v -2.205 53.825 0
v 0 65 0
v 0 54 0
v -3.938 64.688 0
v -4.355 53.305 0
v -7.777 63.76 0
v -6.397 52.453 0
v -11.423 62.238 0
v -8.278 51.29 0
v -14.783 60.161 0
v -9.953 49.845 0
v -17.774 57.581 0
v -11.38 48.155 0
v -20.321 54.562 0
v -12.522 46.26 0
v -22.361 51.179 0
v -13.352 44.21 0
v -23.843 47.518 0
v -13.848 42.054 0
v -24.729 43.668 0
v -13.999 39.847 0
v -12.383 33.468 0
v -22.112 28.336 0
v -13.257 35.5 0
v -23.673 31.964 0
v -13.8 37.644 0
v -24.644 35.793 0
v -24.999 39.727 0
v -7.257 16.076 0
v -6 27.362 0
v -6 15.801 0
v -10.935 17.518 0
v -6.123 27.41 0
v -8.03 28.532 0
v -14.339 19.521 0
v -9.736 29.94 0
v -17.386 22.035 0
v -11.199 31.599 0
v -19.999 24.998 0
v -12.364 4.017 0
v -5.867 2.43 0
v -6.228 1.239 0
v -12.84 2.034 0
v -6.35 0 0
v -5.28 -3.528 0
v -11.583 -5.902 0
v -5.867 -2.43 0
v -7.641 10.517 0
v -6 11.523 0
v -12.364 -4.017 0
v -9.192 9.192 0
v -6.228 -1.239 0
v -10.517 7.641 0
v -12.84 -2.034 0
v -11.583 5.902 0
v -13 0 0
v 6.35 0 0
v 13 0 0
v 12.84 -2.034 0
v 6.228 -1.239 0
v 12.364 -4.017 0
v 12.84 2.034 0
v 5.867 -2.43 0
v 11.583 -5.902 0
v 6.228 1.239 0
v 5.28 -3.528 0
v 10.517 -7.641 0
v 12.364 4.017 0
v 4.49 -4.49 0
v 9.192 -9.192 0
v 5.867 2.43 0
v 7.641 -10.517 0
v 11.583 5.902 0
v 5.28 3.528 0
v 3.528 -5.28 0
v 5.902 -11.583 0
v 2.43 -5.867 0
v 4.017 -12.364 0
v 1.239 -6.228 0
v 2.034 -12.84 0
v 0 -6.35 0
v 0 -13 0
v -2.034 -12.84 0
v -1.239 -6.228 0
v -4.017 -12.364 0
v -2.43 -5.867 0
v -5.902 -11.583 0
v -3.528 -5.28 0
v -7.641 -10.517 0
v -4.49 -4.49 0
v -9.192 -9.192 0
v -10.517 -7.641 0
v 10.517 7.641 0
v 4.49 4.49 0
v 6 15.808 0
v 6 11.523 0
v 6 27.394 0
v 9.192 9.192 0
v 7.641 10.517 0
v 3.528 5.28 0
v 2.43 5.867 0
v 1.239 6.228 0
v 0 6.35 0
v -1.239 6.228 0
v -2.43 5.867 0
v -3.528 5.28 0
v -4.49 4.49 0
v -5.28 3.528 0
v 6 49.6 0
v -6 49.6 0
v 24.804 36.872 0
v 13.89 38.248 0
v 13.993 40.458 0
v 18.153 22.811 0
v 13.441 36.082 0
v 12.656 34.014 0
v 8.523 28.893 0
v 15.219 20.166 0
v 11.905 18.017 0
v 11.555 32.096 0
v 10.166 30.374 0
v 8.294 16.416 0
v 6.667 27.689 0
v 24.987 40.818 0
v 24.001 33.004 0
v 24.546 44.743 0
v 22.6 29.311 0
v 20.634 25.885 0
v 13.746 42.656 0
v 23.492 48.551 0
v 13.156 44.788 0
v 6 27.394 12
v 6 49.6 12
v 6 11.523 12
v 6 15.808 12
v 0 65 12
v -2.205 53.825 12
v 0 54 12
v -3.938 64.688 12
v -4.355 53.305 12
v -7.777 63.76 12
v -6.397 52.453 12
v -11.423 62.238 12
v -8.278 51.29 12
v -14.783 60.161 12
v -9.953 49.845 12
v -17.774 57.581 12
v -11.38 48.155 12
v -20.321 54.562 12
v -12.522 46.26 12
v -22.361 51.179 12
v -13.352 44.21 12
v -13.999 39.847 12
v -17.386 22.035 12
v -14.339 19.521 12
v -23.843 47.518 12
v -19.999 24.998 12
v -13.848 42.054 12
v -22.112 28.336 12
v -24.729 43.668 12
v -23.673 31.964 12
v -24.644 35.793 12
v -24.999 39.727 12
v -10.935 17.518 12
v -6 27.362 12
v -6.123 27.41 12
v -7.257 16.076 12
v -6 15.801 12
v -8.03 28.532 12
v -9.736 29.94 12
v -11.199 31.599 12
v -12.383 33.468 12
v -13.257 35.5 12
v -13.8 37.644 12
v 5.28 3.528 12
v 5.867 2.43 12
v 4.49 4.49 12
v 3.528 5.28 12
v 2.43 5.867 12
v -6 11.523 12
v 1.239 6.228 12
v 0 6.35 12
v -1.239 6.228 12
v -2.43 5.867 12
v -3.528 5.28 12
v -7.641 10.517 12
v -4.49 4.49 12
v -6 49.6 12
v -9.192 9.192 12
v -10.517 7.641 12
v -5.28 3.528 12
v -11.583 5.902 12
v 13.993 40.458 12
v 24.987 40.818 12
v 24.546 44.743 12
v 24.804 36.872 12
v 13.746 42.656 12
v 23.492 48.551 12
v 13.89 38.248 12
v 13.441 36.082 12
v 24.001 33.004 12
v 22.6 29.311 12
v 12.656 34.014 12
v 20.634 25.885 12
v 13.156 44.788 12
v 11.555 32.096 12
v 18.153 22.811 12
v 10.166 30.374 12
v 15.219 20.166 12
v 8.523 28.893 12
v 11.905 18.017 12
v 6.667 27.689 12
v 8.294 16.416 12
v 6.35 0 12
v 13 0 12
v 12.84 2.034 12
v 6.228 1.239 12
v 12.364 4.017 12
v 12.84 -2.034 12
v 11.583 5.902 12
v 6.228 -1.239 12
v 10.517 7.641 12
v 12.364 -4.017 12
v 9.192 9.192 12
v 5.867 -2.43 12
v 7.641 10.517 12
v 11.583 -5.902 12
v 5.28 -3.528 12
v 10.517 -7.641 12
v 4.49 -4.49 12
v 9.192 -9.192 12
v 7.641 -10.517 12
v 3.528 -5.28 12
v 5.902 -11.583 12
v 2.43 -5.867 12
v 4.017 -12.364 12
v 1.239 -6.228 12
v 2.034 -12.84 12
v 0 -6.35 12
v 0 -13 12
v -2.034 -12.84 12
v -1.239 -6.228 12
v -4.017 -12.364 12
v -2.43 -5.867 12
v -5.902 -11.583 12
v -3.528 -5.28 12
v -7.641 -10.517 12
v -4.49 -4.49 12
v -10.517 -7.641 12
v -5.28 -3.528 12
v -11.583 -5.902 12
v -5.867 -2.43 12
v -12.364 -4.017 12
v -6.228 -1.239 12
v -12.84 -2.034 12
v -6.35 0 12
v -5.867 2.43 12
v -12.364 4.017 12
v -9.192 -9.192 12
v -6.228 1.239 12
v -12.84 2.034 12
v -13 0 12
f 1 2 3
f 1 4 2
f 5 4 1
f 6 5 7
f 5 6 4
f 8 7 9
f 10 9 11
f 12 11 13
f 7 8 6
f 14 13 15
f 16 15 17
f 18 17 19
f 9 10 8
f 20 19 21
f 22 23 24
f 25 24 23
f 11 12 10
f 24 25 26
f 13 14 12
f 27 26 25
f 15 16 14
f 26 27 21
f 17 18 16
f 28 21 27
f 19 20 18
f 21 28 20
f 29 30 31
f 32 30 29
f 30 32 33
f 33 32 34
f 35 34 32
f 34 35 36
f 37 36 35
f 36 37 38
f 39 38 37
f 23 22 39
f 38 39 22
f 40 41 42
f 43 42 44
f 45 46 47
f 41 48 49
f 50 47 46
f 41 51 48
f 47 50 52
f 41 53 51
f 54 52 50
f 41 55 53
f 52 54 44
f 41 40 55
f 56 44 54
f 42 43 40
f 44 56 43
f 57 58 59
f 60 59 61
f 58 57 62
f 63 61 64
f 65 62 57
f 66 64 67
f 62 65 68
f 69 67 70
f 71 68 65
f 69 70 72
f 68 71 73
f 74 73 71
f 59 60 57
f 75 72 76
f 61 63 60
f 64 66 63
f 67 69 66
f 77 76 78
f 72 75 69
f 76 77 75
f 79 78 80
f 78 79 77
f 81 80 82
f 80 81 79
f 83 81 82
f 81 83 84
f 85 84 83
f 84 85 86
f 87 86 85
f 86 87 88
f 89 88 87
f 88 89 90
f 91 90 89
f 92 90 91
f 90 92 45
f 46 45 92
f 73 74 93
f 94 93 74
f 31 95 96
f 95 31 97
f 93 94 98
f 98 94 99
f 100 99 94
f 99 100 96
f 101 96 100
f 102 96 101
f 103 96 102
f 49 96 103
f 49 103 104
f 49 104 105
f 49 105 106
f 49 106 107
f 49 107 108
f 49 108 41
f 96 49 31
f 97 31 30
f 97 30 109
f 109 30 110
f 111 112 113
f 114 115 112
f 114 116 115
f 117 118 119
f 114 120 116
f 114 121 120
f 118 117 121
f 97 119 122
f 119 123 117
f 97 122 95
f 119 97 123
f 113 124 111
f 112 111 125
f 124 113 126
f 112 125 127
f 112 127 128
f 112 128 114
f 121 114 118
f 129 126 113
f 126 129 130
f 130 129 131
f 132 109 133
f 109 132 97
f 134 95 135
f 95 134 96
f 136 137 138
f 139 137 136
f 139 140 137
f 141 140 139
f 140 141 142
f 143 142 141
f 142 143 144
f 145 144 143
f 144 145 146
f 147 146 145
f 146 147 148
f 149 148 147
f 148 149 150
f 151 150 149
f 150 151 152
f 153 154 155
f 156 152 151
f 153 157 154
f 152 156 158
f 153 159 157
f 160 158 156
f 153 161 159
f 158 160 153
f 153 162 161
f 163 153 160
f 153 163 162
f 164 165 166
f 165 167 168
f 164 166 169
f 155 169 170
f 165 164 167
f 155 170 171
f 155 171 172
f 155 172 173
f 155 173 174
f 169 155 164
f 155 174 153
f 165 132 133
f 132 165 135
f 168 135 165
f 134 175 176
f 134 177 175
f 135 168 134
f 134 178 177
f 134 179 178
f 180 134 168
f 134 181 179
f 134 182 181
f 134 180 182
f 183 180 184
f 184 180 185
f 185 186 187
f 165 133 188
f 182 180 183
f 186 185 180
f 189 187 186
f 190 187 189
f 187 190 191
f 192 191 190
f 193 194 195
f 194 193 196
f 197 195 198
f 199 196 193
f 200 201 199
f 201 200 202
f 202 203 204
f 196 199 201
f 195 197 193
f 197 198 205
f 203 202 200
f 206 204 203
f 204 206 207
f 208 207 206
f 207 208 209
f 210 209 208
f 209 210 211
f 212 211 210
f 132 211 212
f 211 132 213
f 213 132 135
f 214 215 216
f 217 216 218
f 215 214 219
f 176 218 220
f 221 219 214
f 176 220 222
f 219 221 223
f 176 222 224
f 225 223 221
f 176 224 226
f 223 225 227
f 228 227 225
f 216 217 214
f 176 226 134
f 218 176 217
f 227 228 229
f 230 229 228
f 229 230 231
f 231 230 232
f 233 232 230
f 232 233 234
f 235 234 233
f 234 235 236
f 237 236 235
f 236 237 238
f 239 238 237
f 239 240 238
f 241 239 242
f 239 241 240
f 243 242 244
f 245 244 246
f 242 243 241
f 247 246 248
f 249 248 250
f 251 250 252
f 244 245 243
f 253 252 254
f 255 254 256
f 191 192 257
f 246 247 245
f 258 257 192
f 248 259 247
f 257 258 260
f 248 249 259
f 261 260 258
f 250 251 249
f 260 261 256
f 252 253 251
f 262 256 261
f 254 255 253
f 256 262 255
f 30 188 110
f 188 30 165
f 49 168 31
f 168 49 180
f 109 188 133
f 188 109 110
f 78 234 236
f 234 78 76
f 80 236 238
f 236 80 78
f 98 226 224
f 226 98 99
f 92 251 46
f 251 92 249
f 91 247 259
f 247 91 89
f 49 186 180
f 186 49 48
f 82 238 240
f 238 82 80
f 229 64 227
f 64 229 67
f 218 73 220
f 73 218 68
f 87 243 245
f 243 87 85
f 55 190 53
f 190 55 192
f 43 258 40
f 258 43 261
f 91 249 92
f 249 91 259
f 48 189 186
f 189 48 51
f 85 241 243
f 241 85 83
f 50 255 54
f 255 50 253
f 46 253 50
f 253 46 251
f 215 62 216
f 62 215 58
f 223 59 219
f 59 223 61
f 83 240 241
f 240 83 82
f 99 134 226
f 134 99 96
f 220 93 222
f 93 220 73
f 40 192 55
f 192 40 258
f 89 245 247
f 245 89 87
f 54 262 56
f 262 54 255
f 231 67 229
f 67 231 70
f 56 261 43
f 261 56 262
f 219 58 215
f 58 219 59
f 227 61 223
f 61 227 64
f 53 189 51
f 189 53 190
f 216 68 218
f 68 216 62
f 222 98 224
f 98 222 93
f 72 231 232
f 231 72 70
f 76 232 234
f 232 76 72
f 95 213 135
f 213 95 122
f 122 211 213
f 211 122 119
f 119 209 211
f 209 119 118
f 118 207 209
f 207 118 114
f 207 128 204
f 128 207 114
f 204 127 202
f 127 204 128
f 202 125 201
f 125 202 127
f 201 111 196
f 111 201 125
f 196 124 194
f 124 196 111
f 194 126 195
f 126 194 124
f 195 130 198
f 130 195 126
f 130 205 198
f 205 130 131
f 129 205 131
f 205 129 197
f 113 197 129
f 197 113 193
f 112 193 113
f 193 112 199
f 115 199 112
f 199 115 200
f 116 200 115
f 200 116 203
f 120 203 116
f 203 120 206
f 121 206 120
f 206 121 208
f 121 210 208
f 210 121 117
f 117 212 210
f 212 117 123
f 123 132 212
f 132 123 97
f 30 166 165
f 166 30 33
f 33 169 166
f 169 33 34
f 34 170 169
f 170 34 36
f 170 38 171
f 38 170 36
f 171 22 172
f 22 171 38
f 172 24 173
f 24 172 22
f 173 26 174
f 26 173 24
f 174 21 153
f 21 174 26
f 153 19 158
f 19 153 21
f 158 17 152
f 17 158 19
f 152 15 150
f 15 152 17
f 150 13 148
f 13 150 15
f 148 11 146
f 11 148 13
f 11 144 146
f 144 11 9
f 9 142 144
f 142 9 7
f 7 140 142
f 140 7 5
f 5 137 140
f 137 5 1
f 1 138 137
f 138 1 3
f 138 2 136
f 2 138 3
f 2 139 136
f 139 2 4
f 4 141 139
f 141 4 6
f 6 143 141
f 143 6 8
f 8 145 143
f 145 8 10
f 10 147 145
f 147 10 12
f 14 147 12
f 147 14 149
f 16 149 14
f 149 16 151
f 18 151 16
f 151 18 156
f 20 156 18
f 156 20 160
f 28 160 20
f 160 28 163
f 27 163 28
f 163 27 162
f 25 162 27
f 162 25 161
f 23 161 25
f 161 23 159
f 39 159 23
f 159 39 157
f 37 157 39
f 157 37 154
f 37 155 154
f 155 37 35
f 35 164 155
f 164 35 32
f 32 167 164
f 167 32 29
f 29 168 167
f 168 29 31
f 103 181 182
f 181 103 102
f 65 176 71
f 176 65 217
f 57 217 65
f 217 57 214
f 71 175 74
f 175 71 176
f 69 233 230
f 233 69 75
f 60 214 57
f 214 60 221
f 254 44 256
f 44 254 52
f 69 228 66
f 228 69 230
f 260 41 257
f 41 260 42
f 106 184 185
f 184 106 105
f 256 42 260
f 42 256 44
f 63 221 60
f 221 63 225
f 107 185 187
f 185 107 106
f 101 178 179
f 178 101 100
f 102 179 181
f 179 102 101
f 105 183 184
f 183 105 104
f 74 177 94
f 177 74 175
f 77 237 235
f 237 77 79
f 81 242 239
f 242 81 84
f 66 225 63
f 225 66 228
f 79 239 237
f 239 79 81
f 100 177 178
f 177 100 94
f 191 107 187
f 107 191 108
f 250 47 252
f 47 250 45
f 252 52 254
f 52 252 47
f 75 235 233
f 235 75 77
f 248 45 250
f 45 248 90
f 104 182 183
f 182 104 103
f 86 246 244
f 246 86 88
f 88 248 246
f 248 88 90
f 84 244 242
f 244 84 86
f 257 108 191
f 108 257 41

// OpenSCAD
$fn = 32;

// ----------------------------------------------------------------------
// Hook: 80 mm shank into a 14 mm curl, 12 mm thick
// ----------------------------------------------------------------------

// --- parameters (mm) ---
shank_len = 80;           // shank length from the boss centre
shank_w = 12;             // shank width
boss_d = 26;              // boss diameter
bore_d = 12.7;            // boss bore
curl_in = 14;             // curl inner radius
curl_out = 25;            // curl outer radius
curl_sweep = 290;         // curl sweep angle
hook_t = 12;              // hook thickness

shank_profile = [[-6, 49.6], [6, 49.6], [6, 11], [-6, 11]];
boss_profile = [[13, 0], [12.84, 2.034], [12.364, 4.017], [11.583, 5.902], [10.517, 7.641], [9.192, 9.192], [7.641, 10.517], [5.902, 11.583], [4.017, 12.364], [2.034, 12.84], [0, 13], [-2.034, 12.84], [-4.017, 12.364], [-5.902, 11.583], [-7.641, 10.517], [-9.192, 9.192], [-10.517, 7.641], [-11.583, 5.902], [-12.364, 4.017], [-12.84, 2.034], [-13, 0], [-12.84, -2.034], [-12.364, -4.017], [-11.583, -5.902], [-10.517, -7.641], [-9.192, -9.192], [-7.641, -10.517], [-5.902, -11.583], [-4.017, -12.364], [-2.034, -12.84], [0, -13], [2.034, -12.84], [4.017, -12.364], [5.902, -11.583], [7.641, -10.517], [9.192, -9.192], [10.517, -7.641], [11.583, -5.902], [12.364, -4.017], [12.84, -2.034]];
curl_profile = [[0, 65], [-3.938, 64.688], [-7.777, 63.76], [-11.423, 62.238], [-14.783, 60.161], [-17.774, 57.581], [-20.321, 54.562], [-22.361, 51.179], [-23.843, 47.518], [-24.729, 43.668], [-24.999, 39.727], [-24.644, 35.793], [-23.673, 31.964], [-22.112, 28.336], [-19.999, 24.998], [-17.386, 22.035], [-14.339, 19.521], [-10.935, 17.518], [-7.257, 16.076], [-3.398, 15.232], [0.545, 15.006], [4.475, 15.404], [8.294, 16.416], [11.905, 18.017], [15.219, 20.166], [18.153, 22.811], [20.634, 25.885], [22.6, 29.311], [24.001, 33.004], [24.804, 36.872], [24.987, 40.818], [24.546, 44.743], [23.492, 48.551], [13.156, 44.788], [13.746, 42.656], [13.993, 40.458], [13.89, 38.248], [13.441, 36.082], [12.656, 34.014], [11.555, 32.096], [10.166, 30.374], [8.523, 28.893], [6.667, 27.689], [4.644, 26.793], [2.506, 26.226], [0.305, 26.003], [-1.903, 26.13], [-4.064, 26.603], [-6.123, 27.41], [-8.03, 28.532], [-9.736, 29.94], [-11.199, 31.599], [-12.383, 33.468], [-13.257, 35.5], [-13.8, 37.644], [-13.999, 39.847], [-13.848, 42.054], [-13.352, 44.21], [-12.522, 46.26], [-11.38, 48.155], [-9.953, 49.845], [-8.278, 51.29], [-6.397, 52.453], [-4.355, 53.305], [-2.205, 53.825], [0, 54]];

difference() {
  union() {
    /* three overlapping outlines: shank, boss and the smooth curl */
    linear_extrude(height = hook_t) polygon(shank_profile);
    linear_extrude(height = hook_t) polygon(boss_profile);
    linear_extrude(height = hook_t) polygon(curl_profile);
  }
  translate([0, 0, -2.5]) cylinder(h = hook_t + 5, d = bore_d);
}
